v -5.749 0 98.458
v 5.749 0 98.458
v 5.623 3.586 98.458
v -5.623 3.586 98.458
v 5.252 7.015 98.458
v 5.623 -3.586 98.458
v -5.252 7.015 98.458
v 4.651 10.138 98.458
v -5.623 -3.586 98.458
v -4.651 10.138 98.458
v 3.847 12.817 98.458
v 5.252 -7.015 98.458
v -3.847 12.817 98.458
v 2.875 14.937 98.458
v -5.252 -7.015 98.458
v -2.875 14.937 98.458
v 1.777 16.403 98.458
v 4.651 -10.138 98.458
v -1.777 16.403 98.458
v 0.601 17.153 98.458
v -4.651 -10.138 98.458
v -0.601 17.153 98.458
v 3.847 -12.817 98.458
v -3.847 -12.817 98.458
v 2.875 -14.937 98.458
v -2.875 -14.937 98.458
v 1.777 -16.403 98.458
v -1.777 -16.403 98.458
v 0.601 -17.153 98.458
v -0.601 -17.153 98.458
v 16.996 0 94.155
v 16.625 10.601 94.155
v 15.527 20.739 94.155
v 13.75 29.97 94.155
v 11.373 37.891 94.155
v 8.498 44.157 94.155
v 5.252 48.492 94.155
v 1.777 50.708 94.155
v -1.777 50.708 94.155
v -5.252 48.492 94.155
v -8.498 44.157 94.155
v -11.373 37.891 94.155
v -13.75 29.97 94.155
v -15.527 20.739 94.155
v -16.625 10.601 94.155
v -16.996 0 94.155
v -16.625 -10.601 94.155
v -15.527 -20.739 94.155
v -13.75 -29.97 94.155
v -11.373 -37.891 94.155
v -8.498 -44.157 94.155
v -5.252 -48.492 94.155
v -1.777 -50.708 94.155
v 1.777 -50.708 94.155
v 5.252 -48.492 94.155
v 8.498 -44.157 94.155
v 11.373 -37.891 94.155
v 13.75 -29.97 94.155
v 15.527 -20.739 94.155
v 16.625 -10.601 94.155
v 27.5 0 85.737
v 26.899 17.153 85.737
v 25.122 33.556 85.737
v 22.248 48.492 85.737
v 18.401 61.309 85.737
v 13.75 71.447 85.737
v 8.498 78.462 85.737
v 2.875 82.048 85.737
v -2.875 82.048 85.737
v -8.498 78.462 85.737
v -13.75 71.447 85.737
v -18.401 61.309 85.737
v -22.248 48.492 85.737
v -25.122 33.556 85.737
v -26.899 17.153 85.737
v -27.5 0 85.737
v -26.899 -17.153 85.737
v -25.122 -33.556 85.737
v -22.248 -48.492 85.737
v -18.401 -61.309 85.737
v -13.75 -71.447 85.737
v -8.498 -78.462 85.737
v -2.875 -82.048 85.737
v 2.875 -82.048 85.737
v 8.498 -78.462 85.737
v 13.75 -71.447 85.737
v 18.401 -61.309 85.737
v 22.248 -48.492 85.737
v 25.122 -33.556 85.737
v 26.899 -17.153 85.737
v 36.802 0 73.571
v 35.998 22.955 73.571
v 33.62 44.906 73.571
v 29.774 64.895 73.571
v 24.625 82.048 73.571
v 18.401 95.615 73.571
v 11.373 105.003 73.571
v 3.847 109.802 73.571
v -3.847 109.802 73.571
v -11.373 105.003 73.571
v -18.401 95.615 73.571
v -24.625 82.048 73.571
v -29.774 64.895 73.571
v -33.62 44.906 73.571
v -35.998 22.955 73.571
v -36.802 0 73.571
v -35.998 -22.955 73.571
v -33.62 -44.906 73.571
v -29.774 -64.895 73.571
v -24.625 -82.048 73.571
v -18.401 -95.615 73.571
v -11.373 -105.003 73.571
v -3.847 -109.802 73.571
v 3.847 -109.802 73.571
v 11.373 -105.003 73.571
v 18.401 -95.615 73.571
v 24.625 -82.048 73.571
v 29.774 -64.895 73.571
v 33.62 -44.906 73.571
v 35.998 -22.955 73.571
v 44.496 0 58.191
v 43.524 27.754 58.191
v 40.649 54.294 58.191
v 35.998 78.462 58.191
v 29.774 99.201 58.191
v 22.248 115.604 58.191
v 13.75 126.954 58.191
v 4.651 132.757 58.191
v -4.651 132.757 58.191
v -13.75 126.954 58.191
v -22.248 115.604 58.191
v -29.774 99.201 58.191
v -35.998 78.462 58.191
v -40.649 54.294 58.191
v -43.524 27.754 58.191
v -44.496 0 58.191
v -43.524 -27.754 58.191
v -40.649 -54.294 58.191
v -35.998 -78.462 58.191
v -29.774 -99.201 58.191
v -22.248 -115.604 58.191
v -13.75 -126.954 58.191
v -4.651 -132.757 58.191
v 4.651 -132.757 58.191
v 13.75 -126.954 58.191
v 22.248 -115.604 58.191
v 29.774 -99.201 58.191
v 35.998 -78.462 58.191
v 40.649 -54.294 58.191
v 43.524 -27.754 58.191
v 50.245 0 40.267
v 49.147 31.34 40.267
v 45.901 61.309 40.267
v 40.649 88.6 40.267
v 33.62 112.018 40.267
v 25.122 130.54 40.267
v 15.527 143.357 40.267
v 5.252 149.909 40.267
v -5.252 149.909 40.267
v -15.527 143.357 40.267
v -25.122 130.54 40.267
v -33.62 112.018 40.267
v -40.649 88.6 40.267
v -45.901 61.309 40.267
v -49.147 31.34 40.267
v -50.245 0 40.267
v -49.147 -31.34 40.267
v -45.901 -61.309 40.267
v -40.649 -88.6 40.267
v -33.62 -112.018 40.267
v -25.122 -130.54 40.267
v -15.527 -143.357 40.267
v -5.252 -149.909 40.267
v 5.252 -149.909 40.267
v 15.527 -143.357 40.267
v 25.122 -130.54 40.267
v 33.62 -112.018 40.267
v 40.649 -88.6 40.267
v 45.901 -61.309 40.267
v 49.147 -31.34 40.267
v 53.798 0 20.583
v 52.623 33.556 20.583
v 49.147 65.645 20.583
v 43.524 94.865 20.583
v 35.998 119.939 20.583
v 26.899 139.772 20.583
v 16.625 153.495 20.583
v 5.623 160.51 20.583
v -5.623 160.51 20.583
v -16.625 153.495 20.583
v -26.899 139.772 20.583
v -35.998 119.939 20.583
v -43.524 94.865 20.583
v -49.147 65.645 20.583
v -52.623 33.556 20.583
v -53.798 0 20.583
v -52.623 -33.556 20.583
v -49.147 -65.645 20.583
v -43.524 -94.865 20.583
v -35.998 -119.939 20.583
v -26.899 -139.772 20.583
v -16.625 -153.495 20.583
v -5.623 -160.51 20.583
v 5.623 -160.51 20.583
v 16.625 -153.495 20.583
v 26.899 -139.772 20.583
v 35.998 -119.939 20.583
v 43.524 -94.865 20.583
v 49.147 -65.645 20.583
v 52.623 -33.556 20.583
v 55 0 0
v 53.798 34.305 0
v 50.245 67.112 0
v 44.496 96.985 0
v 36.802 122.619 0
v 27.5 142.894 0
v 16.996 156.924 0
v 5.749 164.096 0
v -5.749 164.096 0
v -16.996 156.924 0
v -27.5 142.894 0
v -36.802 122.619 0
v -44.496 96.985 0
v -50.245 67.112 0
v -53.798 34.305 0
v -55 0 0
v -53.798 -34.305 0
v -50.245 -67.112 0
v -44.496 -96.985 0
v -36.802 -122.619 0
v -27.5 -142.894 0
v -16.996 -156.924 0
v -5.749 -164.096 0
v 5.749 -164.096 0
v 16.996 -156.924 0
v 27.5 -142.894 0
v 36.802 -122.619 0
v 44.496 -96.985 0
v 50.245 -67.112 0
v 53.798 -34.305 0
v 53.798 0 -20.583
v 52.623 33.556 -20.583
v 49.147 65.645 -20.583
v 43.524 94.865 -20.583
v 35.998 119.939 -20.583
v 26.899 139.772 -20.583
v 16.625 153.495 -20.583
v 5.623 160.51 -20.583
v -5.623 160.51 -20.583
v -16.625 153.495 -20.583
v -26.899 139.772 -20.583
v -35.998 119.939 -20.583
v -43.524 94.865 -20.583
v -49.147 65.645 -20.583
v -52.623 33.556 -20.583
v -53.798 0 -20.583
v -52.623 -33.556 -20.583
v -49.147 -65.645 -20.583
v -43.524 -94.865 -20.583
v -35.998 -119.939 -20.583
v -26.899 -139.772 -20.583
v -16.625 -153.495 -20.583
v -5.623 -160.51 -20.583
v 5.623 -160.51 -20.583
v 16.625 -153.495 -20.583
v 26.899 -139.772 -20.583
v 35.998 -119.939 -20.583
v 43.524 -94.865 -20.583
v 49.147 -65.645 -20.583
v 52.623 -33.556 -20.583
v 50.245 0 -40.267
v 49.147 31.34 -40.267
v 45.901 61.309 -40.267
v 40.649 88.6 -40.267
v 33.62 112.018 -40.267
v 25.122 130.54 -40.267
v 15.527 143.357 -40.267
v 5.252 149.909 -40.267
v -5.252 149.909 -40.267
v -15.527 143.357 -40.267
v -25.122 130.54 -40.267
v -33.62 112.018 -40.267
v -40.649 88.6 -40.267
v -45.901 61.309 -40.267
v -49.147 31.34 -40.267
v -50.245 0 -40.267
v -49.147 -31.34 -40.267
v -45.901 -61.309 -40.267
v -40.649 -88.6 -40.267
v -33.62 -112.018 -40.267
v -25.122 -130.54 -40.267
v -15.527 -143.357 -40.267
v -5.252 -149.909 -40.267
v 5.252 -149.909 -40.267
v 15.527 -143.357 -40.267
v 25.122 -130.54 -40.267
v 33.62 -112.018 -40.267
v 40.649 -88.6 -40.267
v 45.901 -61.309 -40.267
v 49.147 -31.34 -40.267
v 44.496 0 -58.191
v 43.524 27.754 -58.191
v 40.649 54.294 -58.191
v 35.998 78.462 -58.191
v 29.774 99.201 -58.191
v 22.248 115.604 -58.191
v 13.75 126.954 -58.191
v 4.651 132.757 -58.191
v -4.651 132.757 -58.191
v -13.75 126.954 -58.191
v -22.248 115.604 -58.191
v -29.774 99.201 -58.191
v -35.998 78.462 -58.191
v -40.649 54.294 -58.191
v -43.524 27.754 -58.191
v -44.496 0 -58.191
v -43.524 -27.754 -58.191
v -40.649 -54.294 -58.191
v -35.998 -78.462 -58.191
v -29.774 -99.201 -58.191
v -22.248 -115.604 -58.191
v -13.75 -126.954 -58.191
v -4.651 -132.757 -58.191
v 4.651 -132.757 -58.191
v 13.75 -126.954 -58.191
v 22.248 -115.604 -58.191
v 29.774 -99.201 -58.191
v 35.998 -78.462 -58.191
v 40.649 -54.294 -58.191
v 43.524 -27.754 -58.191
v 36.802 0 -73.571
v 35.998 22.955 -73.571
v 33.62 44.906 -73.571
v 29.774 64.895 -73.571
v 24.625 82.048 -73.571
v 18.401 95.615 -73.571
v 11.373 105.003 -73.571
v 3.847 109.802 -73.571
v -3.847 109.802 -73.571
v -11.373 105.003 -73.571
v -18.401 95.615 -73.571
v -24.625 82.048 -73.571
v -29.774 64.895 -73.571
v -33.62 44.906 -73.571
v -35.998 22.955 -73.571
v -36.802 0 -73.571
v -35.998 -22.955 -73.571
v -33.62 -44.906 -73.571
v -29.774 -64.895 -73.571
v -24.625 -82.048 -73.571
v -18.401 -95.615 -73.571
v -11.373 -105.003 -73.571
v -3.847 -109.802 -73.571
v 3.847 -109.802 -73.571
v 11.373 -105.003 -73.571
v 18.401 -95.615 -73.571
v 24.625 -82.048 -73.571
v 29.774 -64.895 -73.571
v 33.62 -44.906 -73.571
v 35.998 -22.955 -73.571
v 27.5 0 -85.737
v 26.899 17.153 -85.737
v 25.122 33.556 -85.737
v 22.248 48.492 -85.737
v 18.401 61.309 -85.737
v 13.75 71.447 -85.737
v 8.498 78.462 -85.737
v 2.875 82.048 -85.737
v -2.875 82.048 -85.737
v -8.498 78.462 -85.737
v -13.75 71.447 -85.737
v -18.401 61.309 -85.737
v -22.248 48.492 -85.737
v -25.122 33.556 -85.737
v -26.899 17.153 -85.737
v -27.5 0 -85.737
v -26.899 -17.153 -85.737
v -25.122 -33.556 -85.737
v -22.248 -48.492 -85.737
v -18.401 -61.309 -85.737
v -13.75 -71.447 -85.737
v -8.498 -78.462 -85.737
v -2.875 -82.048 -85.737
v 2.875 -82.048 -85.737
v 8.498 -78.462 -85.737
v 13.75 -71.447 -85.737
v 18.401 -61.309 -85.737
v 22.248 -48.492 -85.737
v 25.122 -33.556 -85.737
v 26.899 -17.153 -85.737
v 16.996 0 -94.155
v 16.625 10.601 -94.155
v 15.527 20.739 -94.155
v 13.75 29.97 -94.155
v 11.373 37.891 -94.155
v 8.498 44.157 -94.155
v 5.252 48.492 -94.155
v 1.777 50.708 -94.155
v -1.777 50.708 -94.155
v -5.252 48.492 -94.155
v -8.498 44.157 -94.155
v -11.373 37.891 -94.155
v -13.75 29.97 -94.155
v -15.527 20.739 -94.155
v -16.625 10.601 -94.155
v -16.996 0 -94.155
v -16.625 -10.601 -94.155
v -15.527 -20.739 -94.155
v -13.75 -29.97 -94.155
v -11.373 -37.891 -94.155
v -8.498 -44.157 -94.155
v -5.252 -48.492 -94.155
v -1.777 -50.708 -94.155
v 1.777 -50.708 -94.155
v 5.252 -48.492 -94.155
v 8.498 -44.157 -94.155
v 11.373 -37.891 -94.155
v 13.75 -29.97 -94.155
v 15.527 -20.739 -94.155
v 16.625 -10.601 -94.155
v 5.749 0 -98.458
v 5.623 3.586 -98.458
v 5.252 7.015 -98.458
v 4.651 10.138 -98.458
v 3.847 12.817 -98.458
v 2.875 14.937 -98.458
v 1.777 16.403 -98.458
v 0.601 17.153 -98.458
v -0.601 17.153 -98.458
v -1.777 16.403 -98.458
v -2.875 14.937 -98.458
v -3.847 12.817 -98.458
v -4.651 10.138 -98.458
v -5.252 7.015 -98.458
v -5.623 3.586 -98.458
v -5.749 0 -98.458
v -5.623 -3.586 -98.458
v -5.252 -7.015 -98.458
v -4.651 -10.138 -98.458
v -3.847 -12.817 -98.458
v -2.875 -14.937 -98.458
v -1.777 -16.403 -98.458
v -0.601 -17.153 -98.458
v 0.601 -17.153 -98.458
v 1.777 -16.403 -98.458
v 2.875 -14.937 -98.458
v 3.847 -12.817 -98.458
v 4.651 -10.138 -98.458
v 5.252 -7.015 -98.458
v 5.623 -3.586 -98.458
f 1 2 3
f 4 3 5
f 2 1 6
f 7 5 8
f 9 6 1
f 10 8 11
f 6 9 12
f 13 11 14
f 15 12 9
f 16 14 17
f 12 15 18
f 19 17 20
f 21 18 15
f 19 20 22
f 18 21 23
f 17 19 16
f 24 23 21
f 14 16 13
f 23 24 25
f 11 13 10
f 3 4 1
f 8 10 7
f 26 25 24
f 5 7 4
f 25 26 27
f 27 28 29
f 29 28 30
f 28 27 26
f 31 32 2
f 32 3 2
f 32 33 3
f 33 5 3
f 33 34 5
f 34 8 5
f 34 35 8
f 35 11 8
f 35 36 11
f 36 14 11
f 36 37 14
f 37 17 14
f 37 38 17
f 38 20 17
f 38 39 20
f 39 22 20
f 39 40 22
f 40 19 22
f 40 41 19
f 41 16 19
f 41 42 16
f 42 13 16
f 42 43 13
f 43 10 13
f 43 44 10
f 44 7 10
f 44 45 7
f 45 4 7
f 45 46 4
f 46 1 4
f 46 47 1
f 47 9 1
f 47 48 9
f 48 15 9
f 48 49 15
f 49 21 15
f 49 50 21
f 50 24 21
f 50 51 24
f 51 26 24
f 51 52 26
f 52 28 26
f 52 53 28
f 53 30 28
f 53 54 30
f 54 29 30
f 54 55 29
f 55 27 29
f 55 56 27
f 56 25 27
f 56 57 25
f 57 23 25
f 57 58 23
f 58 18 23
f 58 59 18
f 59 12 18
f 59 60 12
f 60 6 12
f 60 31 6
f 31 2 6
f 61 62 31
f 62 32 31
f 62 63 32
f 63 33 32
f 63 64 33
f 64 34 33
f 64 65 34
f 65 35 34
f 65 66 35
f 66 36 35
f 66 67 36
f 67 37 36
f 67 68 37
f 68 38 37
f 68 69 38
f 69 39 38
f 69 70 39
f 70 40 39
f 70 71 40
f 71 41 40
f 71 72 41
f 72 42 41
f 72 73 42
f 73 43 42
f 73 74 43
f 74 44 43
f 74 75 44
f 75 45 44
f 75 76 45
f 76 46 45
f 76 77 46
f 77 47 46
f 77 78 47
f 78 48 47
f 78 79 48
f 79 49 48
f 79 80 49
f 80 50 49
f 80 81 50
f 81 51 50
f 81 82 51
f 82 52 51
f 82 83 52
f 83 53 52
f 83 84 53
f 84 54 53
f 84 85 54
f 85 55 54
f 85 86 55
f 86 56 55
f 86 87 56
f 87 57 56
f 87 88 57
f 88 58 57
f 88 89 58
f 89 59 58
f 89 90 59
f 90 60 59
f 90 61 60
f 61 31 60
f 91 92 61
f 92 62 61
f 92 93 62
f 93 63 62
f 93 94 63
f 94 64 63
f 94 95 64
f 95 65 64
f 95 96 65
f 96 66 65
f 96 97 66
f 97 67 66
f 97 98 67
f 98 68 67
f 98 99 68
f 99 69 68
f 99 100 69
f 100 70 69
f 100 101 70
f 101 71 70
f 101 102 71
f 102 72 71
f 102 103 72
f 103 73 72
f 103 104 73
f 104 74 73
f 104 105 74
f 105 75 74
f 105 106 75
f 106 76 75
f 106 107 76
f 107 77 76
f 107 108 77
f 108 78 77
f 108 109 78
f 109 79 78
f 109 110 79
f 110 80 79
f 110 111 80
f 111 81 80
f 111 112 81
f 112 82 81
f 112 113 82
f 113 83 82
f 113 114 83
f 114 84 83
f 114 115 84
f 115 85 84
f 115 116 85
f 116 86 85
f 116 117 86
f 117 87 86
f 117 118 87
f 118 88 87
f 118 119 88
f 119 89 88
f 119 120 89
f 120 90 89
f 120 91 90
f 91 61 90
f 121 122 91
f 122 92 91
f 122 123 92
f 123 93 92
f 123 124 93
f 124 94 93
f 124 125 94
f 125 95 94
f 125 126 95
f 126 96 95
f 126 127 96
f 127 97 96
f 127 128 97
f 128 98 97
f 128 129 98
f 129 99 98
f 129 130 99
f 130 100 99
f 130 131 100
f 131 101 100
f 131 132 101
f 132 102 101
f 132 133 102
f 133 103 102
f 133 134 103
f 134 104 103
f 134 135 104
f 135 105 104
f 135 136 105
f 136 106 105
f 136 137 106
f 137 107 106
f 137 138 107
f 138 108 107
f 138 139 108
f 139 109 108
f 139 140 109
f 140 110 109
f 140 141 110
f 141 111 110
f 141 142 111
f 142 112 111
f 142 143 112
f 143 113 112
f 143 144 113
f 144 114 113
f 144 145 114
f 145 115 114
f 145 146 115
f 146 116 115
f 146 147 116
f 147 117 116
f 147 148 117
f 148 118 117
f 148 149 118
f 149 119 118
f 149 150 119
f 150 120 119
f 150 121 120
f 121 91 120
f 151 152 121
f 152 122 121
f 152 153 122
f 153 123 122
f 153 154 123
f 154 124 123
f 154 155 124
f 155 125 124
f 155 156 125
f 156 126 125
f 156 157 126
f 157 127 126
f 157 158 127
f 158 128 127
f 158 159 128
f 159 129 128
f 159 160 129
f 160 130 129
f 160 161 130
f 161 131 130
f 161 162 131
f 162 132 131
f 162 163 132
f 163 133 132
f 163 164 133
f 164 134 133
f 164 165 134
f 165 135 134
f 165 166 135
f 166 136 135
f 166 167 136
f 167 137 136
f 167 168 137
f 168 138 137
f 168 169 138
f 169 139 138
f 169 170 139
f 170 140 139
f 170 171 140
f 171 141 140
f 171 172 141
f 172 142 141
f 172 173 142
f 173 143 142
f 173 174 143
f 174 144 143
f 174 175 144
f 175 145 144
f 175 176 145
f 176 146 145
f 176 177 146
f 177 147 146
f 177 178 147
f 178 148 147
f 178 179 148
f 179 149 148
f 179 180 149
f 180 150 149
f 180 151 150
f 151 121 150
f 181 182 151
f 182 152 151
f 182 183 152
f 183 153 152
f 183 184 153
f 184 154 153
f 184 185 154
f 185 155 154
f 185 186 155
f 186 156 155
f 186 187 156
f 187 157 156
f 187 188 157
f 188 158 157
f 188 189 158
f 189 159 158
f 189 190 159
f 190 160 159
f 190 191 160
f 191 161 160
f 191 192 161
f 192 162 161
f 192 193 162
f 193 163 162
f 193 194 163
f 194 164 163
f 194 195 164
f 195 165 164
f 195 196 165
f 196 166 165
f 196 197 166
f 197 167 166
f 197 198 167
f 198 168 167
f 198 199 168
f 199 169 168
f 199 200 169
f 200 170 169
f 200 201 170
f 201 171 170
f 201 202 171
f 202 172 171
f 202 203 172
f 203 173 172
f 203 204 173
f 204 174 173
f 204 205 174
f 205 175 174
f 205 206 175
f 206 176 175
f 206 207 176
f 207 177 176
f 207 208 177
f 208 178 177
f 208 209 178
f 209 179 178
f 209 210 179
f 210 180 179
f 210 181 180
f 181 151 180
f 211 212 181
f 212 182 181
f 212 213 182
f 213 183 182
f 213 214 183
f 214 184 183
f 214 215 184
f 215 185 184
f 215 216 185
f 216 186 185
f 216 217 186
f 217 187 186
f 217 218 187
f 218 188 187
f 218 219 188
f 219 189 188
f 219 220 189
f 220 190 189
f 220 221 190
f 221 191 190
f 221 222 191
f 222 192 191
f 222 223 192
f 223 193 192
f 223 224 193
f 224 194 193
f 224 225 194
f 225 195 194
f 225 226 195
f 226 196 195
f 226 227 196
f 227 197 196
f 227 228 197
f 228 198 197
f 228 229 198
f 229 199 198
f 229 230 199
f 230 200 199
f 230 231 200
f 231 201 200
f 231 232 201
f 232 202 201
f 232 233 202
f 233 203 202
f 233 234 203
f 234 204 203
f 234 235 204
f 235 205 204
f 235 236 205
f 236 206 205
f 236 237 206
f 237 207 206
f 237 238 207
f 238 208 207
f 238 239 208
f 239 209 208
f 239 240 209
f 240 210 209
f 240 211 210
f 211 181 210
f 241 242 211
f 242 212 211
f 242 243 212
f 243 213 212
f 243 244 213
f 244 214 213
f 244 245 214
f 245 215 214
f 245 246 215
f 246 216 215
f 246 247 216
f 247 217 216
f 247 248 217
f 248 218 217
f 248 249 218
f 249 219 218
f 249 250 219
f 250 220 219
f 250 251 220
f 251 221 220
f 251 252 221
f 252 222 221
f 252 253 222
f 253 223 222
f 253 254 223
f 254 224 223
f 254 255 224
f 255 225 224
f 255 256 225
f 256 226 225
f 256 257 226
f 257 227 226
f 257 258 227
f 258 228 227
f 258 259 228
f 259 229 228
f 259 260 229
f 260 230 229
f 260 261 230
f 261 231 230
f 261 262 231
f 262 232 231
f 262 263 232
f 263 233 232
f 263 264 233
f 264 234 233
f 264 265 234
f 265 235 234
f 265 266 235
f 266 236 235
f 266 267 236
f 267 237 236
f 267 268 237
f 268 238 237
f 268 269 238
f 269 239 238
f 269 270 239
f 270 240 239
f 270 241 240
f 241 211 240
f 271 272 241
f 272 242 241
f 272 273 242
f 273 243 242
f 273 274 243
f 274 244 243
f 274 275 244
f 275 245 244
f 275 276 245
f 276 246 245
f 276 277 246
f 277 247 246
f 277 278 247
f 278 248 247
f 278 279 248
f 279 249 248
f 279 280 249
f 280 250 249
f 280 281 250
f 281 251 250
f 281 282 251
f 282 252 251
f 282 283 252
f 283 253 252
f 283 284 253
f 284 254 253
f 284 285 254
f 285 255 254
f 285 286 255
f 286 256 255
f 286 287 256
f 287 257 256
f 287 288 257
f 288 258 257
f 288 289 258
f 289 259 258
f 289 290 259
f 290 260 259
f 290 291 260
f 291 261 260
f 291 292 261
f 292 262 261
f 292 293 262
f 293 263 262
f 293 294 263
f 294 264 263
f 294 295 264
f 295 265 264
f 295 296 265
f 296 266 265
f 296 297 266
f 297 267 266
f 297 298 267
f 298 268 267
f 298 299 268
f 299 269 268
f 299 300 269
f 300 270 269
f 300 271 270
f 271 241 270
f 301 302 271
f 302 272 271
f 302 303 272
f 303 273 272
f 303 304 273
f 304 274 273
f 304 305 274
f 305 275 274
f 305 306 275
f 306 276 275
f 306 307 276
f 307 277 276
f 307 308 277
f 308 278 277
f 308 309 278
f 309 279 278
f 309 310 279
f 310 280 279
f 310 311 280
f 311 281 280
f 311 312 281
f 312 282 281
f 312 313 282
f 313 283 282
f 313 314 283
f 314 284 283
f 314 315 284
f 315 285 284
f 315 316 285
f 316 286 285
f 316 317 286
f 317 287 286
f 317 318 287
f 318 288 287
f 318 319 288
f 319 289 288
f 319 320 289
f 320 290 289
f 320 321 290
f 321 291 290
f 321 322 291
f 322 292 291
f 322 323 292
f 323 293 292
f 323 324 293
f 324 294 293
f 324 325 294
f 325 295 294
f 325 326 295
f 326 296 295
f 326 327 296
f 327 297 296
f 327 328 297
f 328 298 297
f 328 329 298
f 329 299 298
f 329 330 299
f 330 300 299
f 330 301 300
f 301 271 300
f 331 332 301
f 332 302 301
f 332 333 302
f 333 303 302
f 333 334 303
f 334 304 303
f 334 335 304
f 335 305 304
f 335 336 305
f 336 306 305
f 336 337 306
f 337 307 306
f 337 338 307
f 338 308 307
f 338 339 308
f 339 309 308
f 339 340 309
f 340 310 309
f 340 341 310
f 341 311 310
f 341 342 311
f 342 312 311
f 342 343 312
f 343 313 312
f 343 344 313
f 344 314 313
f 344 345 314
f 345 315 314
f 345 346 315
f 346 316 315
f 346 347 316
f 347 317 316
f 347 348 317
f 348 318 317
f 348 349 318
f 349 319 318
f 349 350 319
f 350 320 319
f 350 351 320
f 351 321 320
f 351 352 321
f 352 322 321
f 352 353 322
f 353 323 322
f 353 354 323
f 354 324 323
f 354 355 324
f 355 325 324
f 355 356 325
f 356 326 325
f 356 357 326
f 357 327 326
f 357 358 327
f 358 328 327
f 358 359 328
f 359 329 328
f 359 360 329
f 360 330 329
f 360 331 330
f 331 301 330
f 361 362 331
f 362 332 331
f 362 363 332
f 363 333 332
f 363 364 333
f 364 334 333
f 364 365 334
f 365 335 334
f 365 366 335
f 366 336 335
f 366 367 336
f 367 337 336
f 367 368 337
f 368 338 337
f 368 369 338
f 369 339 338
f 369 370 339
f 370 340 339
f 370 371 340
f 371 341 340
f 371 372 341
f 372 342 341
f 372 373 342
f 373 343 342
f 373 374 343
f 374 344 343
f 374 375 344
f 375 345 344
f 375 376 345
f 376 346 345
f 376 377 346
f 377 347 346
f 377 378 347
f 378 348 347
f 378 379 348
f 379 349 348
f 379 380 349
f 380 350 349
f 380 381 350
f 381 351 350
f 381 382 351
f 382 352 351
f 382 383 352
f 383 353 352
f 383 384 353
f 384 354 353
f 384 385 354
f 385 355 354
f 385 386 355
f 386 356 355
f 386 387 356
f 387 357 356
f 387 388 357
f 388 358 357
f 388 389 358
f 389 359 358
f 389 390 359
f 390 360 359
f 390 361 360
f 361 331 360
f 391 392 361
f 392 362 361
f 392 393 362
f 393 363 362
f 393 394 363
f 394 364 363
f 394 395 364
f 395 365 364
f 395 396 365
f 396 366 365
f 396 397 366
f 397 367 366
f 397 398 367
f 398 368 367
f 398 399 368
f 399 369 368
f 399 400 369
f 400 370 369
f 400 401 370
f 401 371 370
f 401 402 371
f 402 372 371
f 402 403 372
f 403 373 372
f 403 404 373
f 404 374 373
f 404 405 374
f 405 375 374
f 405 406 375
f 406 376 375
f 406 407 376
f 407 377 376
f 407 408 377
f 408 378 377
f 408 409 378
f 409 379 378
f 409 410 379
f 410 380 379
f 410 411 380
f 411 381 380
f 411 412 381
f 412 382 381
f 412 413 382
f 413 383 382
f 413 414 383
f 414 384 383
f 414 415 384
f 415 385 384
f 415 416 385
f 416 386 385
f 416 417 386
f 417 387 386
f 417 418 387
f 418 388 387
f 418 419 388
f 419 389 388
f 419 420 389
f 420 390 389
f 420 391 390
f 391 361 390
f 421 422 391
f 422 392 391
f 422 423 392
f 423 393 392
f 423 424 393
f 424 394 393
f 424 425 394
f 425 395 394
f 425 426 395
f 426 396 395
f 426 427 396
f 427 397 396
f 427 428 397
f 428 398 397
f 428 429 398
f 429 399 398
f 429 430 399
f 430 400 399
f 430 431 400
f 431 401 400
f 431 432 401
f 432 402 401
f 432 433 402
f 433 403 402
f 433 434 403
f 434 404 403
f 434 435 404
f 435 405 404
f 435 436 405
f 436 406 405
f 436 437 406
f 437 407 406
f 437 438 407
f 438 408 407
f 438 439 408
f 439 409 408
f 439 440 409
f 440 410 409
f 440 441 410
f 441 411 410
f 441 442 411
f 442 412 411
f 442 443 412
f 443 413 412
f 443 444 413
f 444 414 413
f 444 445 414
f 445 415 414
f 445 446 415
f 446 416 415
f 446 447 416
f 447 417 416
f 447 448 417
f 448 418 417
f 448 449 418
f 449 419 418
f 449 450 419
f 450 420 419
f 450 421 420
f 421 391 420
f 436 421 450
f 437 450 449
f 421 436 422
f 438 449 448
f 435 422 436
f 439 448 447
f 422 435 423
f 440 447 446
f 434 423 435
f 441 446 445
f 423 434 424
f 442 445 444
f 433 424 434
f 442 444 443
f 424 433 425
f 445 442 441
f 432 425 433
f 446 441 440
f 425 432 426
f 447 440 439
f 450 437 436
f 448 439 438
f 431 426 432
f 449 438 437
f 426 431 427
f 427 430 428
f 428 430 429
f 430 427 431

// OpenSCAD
// Generated by SolidPython 1.0.1 on 2020-07-29 00:46:46


scale(v = [5, 15, 9]) {
	sphere(r = 11);
}
/***********************************************
*********      SolidPython code:      **********
************************************************
 
# import packages: SolidPython
from solid import *
from solid.utils import *
from itertools import chain, combinations, permutations


class Resize:

    def __init__(self, scad_file):
        self.scad_file = scad_file
        #self.scad_file = import_scad(scad_file)
        # cone/cylinder param:
        self.r1 = 0
        self.r2 = 0
        self.h = 0
        # rectangular prism param:
        self.w = 0
        self.l = 0
        # ellipse param:
        self.r = 0

    # import OpenScad code (file name corresponds to shape)


    # classify shape + parameters
    def assign(self, param1, param2, param3):
        if self.scad_file == 'cone.scad':
            self.r1 = param1
            self.r2 = param2
            self.h = param3
        elif self.scad_file == 'cylinder.scad':
            self.r1 = param1
            self.r2 = param2
            self.h = param3
        elif self.scad_file == 'rectangularPrism.scad':
            self.h = param1
            self.l = param2
            self.w = param3
        else:
            self.r = param1
            self.h = param2

    # resize parameters
    def iterate(self):
        x = range(3, 20, 2)
        i = 1
        if self.scad_file == 'cone.scad':
            tempList = list(permutations(x, 2))
            for temp in tempList:
                param1 = temp[0]
                param2 = temp[1]
                filepath = 'produced_scad_files/' + 'cone' + str(param1) + '_' + str(param2) + '_' + '.scad'
                scad_render_to_file(cylinder(h=param1, r1=param2, r2=0), filepath)

        elif self.scad_file == 'cylinder.scad':
            tempList = list(permutations(x, 3))
            for temp in tempList:
                param1 = temp[0]
                param2 = temp[1]
                filepath = 'produced_scad_files/' + 'cylinder' + str(param1) + '_' + str(param2) + '_' + '.scad'
                scad_render_to_file(cylinder(h=param1, r1=param2, r2=param2), filepath)

        elif self.scad_file == 'rectangularPrism.scad':
            tempList = list(permutations(x, 3))
            for temp in tempList:
                param1 = temp[0]
                param2 = temp[1]
                param3 = temp[2]
                filepath = 'produced_scad_files/' + 'rectangularPrism' + str(param1) + '_' + str(param2) + '_' + str(
                    param3) + '.scad'
                scad_render_to_file(cube(size=(param1, param2, param3)), filepath)

        elif self.scad_file == 'ellipse.scad':
            tempList = list(permutations(x, 4))
            for temp in tempList:
                param1 = temp[0]
                param2 = temp[1]
                param3 = temp[2]
                param4 = temp[3]
                filepath = 'produced_scad_files/' + 'ellipse' + str(param1) + '_' + str(param2) + '_' + str(param3) + '_' + str(param4) + '.scad'
                scad_render_to_file(scale([param1, param2, param3])(sphere(r=param4)), filepath)

    def render_to_scadfile(self):
        scad_render_to_file(scad, 'example.scad') 
 
************************************************/
